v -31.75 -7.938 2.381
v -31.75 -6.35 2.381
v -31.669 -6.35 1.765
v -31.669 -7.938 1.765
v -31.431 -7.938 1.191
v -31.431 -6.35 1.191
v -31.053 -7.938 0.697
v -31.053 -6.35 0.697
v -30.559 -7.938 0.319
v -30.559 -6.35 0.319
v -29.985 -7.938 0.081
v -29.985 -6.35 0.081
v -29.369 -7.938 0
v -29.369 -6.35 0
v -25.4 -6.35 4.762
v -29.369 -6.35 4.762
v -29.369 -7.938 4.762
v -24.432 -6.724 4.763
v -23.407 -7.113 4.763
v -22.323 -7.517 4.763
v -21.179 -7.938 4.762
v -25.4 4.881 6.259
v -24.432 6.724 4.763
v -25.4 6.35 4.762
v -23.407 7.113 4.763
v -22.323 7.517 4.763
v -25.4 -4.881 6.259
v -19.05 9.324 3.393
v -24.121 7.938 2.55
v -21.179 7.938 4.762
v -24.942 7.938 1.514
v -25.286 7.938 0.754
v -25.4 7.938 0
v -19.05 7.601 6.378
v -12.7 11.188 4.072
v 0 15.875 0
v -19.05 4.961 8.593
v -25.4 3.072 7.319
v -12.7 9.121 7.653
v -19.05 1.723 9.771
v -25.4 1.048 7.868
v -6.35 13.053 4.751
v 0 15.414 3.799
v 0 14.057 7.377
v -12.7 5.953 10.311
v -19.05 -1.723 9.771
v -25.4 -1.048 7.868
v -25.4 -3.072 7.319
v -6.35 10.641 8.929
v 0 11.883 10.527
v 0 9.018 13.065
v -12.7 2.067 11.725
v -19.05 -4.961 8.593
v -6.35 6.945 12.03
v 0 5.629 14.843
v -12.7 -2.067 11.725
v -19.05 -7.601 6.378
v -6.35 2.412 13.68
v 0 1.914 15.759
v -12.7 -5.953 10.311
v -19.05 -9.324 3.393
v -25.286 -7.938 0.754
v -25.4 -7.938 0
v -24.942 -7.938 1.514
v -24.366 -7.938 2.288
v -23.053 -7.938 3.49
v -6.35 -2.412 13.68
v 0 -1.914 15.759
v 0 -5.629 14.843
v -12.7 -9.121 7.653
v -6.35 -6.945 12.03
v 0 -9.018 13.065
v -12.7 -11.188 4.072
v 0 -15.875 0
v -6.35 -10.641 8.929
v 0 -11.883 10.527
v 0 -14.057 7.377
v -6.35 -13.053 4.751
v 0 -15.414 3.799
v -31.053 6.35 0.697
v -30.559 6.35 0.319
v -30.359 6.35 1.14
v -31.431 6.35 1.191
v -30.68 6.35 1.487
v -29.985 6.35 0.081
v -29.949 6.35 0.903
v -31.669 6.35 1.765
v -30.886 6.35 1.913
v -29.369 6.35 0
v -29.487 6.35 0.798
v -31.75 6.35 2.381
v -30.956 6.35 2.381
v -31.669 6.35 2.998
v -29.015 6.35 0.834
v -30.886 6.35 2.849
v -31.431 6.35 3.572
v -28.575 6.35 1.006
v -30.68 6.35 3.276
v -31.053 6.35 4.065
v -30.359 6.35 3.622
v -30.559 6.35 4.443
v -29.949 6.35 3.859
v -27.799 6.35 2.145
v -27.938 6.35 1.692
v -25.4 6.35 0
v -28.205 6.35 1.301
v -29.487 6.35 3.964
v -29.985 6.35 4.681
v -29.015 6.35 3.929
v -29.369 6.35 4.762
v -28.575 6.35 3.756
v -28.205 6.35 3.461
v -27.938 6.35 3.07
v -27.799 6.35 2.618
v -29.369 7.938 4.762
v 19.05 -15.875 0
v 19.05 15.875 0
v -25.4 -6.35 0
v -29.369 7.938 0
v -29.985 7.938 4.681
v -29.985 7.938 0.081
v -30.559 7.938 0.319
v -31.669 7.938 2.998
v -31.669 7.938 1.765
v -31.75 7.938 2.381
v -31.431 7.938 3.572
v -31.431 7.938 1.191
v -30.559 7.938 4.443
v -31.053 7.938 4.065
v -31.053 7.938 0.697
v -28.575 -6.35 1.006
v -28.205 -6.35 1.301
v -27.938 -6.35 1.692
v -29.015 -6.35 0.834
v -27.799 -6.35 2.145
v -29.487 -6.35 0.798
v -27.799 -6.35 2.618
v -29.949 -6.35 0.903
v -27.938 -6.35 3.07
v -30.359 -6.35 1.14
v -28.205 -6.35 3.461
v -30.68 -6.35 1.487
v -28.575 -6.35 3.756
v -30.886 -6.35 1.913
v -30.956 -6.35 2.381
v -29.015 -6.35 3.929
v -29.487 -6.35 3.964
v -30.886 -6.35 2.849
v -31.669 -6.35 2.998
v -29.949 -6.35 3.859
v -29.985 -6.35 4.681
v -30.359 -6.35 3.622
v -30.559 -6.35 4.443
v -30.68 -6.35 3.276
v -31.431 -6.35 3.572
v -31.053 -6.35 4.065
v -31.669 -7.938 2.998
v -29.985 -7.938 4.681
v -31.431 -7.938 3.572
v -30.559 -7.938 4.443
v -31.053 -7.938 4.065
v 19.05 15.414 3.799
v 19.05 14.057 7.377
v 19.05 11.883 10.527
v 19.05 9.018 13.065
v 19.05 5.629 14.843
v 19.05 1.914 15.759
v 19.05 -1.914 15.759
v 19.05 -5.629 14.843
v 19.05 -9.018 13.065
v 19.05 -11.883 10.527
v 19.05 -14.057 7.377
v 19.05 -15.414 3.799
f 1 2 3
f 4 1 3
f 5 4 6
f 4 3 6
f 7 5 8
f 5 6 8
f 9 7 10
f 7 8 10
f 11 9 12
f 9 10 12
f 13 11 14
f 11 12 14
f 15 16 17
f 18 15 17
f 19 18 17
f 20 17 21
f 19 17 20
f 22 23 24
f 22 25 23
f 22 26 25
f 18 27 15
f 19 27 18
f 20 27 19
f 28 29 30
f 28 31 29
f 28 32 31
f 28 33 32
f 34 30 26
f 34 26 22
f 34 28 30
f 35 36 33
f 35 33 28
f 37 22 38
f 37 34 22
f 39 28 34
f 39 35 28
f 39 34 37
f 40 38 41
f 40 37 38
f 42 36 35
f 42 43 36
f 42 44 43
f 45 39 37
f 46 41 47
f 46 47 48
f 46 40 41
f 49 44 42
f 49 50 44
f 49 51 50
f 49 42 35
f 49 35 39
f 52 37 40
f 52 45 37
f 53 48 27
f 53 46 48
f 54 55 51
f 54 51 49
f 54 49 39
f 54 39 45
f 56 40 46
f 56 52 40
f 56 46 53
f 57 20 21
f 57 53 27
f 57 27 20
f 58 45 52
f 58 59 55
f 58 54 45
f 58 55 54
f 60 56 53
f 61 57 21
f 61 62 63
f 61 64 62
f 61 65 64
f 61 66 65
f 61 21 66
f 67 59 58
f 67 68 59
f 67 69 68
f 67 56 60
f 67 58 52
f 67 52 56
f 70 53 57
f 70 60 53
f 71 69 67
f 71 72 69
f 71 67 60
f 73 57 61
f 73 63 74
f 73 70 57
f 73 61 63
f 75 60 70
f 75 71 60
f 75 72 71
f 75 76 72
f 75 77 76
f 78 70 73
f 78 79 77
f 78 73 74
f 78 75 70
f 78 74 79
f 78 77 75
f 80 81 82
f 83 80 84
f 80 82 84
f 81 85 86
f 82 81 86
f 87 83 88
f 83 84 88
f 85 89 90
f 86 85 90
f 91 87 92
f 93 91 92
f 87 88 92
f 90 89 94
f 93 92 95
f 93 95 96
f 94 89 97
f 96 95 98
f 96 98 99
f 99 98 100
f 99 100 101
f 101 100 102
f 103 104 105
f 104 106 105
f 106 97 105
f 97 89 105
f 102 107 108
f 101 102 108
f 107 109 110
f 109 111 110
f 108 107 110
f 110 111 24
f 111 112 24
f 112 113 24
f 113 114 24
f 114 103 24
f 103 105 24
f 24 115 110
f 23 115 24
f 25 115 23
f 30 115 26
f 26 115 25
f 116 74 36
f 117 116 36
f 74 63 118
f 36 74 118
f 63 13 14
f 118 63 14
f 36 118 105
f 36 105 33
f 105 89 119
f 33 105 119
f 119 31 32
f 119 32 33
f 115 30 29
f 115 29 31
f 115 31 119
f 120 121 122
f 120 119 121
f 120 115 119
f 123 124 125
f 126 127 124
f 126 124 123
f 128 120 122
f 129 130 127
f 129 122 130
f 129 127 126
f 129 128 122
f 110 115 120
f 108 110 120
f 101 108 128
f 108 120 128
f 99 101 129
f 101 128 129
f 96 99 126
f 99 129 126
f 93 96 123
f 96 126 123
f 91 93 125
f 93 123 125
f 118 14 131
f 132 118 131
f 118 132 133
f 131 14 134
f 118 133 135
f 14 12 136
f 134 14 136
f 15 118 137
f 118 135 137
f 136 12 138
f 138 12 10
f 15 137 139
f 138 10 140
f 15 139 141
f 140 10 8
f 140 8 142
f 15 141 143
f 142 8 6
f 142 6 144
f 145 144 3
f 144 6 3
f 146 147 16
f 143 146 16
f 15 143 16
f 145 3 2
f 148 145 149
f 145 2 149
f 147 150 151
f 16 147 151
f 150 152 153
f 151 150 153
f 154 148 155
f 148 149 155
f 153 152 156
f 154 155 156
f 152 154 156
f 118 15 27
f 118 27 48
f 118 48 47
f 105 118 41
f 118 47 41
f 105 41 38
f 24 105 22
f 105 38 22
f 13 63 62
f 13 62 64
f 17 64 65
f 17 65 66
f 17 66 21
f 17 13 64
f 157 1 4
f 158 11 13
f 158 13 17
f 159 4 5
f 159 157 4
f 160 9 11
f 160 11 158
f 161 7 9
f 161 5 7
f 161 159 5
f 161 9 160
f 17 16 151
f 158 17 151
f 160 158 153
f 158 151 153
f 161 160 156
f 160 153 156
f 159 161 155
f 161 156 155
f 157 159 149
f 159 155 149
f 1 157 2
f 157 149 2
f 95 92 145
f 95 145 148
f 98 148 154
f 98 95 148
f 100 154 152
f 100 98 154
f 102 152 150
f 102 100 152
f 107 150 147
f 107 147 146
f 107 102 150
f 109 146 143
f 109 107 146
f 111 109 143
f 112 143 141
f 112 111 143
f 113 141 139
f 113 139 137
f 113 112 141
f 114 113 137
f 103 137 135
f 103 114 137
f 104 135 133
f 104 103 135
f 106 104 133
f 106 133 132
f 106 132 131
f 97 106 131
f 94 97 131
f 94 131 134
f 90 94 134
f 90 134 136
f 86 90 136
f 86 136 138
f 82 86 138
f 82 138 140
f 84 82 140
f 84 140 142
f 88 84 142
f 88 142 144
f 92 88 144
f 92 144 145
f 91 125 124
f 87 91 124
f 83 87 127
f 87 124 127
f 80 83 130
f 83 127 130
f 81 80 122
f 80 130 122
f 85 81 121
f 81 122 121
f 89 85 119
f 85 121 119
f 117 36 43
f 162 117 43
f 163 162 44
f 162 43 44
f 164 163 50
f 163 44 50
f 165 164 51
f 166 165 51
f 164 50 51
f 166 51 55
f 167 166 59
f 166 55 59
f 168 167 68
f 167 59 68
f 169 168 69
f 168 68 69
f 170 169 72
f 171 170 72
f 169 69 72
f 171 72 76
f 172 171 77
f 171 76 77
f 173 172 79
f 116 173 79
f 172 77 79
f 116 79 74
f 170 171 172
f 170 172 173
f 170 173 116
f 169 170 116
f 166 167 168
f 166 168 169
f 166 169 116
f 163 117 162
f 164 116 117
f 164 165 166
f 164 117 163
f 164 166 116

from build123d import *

# Parameters (mm, degrees)
F4_DEPTH = 19.05
F5_W     = 1.5875
F5_H     = 4.7625
F6_DEPTH = 6.35
F8_DEPTH = 25.4
F7_R     = 1.5875
F9_DEPTH = 15.875


with BuildPart() as f3:
    # F2 (on offset) → F3 section 0
    with BuildSketch(Plane.YZ.offset(-25.4)):
        with BuildLine():
            Line((-7.9375, 0), (7.9375, 0))
            ThreePointArc((7.9375, 0), (0, 7.9375), (-7.9375, 0))
        make_face()
    # F0 (on Right) → F3 section 1
    with BuildSketch(Plane.YZ):
        with BuildLine():
            ThreePointArc((15.875, 0), (0, 15.875), (-15.875, 0))
            Line((-15.875, 0), (15.875, 0))
        make_face()
    loft()

    # F4 (add): a face of the model
    f4_faces = [f3.faces().sort_by_distance(p)[0] for p in [
        (0, 0, 6.7375592576),
    ]]
    extrude(f4_faces, amount=F4_DEPTH)

    # F5 (on face) → F6 (join, symmetric)
    with BuildSketch(Plane(origin=(-25.4, 0, 0), x_dir=(0, -1, 0), z_dir=(-1, 0, 0))):
        with Locations((-7.14375, 2.38125)):
            Rectangle(F5_W, F5_H)
        with Locations((7.14375, 2.38125)):
            Rectangle(F5_W, F5_H)
    extrude(amount=F6_DEPTH, both=True)

    # F7 (on face) → F8 (cut)
    with BuildSketch(Plane(origin=(0, 7.9375, 0), x_dir=(-1, 0, 0), z_dir=(0, 1, 0))):
        with BuildLine():
            ThreePointArc((29.36875, 4.7625), (31.0525480227, 4.0650480227), (31.75, 2.38125))
            Line((31.75, 2.38125), (31.75, 4.7625))
            Line((31.75, 4.7625), (29.36875, 4.7625))
        make_face()
        with BuildLine():
            Line((31.75, 0), (31.75, 2.38125))
            ThreePointArc((31.75, 2.38125), (31.0525480227, 0.6974519773), (29.36875, 0))
            Line((29.36875, 0), (31.75, 0))
        make_face()
    extrude(amount=-F8_DEPTH, mode=Mode.SUBTRACT)

    # F7 (on face) → F9 (join)
    with BuildSketch(Plane(origin=(0, 7.9375, 0), x_dir=(-1, 0, 0), z_dir=(0, 1, 0))):
        with Locations((29.36875, 2.38125)):
            Circle(F7_R)
    extrude(amount=-F9_DEPTH)


solid = f3.part
